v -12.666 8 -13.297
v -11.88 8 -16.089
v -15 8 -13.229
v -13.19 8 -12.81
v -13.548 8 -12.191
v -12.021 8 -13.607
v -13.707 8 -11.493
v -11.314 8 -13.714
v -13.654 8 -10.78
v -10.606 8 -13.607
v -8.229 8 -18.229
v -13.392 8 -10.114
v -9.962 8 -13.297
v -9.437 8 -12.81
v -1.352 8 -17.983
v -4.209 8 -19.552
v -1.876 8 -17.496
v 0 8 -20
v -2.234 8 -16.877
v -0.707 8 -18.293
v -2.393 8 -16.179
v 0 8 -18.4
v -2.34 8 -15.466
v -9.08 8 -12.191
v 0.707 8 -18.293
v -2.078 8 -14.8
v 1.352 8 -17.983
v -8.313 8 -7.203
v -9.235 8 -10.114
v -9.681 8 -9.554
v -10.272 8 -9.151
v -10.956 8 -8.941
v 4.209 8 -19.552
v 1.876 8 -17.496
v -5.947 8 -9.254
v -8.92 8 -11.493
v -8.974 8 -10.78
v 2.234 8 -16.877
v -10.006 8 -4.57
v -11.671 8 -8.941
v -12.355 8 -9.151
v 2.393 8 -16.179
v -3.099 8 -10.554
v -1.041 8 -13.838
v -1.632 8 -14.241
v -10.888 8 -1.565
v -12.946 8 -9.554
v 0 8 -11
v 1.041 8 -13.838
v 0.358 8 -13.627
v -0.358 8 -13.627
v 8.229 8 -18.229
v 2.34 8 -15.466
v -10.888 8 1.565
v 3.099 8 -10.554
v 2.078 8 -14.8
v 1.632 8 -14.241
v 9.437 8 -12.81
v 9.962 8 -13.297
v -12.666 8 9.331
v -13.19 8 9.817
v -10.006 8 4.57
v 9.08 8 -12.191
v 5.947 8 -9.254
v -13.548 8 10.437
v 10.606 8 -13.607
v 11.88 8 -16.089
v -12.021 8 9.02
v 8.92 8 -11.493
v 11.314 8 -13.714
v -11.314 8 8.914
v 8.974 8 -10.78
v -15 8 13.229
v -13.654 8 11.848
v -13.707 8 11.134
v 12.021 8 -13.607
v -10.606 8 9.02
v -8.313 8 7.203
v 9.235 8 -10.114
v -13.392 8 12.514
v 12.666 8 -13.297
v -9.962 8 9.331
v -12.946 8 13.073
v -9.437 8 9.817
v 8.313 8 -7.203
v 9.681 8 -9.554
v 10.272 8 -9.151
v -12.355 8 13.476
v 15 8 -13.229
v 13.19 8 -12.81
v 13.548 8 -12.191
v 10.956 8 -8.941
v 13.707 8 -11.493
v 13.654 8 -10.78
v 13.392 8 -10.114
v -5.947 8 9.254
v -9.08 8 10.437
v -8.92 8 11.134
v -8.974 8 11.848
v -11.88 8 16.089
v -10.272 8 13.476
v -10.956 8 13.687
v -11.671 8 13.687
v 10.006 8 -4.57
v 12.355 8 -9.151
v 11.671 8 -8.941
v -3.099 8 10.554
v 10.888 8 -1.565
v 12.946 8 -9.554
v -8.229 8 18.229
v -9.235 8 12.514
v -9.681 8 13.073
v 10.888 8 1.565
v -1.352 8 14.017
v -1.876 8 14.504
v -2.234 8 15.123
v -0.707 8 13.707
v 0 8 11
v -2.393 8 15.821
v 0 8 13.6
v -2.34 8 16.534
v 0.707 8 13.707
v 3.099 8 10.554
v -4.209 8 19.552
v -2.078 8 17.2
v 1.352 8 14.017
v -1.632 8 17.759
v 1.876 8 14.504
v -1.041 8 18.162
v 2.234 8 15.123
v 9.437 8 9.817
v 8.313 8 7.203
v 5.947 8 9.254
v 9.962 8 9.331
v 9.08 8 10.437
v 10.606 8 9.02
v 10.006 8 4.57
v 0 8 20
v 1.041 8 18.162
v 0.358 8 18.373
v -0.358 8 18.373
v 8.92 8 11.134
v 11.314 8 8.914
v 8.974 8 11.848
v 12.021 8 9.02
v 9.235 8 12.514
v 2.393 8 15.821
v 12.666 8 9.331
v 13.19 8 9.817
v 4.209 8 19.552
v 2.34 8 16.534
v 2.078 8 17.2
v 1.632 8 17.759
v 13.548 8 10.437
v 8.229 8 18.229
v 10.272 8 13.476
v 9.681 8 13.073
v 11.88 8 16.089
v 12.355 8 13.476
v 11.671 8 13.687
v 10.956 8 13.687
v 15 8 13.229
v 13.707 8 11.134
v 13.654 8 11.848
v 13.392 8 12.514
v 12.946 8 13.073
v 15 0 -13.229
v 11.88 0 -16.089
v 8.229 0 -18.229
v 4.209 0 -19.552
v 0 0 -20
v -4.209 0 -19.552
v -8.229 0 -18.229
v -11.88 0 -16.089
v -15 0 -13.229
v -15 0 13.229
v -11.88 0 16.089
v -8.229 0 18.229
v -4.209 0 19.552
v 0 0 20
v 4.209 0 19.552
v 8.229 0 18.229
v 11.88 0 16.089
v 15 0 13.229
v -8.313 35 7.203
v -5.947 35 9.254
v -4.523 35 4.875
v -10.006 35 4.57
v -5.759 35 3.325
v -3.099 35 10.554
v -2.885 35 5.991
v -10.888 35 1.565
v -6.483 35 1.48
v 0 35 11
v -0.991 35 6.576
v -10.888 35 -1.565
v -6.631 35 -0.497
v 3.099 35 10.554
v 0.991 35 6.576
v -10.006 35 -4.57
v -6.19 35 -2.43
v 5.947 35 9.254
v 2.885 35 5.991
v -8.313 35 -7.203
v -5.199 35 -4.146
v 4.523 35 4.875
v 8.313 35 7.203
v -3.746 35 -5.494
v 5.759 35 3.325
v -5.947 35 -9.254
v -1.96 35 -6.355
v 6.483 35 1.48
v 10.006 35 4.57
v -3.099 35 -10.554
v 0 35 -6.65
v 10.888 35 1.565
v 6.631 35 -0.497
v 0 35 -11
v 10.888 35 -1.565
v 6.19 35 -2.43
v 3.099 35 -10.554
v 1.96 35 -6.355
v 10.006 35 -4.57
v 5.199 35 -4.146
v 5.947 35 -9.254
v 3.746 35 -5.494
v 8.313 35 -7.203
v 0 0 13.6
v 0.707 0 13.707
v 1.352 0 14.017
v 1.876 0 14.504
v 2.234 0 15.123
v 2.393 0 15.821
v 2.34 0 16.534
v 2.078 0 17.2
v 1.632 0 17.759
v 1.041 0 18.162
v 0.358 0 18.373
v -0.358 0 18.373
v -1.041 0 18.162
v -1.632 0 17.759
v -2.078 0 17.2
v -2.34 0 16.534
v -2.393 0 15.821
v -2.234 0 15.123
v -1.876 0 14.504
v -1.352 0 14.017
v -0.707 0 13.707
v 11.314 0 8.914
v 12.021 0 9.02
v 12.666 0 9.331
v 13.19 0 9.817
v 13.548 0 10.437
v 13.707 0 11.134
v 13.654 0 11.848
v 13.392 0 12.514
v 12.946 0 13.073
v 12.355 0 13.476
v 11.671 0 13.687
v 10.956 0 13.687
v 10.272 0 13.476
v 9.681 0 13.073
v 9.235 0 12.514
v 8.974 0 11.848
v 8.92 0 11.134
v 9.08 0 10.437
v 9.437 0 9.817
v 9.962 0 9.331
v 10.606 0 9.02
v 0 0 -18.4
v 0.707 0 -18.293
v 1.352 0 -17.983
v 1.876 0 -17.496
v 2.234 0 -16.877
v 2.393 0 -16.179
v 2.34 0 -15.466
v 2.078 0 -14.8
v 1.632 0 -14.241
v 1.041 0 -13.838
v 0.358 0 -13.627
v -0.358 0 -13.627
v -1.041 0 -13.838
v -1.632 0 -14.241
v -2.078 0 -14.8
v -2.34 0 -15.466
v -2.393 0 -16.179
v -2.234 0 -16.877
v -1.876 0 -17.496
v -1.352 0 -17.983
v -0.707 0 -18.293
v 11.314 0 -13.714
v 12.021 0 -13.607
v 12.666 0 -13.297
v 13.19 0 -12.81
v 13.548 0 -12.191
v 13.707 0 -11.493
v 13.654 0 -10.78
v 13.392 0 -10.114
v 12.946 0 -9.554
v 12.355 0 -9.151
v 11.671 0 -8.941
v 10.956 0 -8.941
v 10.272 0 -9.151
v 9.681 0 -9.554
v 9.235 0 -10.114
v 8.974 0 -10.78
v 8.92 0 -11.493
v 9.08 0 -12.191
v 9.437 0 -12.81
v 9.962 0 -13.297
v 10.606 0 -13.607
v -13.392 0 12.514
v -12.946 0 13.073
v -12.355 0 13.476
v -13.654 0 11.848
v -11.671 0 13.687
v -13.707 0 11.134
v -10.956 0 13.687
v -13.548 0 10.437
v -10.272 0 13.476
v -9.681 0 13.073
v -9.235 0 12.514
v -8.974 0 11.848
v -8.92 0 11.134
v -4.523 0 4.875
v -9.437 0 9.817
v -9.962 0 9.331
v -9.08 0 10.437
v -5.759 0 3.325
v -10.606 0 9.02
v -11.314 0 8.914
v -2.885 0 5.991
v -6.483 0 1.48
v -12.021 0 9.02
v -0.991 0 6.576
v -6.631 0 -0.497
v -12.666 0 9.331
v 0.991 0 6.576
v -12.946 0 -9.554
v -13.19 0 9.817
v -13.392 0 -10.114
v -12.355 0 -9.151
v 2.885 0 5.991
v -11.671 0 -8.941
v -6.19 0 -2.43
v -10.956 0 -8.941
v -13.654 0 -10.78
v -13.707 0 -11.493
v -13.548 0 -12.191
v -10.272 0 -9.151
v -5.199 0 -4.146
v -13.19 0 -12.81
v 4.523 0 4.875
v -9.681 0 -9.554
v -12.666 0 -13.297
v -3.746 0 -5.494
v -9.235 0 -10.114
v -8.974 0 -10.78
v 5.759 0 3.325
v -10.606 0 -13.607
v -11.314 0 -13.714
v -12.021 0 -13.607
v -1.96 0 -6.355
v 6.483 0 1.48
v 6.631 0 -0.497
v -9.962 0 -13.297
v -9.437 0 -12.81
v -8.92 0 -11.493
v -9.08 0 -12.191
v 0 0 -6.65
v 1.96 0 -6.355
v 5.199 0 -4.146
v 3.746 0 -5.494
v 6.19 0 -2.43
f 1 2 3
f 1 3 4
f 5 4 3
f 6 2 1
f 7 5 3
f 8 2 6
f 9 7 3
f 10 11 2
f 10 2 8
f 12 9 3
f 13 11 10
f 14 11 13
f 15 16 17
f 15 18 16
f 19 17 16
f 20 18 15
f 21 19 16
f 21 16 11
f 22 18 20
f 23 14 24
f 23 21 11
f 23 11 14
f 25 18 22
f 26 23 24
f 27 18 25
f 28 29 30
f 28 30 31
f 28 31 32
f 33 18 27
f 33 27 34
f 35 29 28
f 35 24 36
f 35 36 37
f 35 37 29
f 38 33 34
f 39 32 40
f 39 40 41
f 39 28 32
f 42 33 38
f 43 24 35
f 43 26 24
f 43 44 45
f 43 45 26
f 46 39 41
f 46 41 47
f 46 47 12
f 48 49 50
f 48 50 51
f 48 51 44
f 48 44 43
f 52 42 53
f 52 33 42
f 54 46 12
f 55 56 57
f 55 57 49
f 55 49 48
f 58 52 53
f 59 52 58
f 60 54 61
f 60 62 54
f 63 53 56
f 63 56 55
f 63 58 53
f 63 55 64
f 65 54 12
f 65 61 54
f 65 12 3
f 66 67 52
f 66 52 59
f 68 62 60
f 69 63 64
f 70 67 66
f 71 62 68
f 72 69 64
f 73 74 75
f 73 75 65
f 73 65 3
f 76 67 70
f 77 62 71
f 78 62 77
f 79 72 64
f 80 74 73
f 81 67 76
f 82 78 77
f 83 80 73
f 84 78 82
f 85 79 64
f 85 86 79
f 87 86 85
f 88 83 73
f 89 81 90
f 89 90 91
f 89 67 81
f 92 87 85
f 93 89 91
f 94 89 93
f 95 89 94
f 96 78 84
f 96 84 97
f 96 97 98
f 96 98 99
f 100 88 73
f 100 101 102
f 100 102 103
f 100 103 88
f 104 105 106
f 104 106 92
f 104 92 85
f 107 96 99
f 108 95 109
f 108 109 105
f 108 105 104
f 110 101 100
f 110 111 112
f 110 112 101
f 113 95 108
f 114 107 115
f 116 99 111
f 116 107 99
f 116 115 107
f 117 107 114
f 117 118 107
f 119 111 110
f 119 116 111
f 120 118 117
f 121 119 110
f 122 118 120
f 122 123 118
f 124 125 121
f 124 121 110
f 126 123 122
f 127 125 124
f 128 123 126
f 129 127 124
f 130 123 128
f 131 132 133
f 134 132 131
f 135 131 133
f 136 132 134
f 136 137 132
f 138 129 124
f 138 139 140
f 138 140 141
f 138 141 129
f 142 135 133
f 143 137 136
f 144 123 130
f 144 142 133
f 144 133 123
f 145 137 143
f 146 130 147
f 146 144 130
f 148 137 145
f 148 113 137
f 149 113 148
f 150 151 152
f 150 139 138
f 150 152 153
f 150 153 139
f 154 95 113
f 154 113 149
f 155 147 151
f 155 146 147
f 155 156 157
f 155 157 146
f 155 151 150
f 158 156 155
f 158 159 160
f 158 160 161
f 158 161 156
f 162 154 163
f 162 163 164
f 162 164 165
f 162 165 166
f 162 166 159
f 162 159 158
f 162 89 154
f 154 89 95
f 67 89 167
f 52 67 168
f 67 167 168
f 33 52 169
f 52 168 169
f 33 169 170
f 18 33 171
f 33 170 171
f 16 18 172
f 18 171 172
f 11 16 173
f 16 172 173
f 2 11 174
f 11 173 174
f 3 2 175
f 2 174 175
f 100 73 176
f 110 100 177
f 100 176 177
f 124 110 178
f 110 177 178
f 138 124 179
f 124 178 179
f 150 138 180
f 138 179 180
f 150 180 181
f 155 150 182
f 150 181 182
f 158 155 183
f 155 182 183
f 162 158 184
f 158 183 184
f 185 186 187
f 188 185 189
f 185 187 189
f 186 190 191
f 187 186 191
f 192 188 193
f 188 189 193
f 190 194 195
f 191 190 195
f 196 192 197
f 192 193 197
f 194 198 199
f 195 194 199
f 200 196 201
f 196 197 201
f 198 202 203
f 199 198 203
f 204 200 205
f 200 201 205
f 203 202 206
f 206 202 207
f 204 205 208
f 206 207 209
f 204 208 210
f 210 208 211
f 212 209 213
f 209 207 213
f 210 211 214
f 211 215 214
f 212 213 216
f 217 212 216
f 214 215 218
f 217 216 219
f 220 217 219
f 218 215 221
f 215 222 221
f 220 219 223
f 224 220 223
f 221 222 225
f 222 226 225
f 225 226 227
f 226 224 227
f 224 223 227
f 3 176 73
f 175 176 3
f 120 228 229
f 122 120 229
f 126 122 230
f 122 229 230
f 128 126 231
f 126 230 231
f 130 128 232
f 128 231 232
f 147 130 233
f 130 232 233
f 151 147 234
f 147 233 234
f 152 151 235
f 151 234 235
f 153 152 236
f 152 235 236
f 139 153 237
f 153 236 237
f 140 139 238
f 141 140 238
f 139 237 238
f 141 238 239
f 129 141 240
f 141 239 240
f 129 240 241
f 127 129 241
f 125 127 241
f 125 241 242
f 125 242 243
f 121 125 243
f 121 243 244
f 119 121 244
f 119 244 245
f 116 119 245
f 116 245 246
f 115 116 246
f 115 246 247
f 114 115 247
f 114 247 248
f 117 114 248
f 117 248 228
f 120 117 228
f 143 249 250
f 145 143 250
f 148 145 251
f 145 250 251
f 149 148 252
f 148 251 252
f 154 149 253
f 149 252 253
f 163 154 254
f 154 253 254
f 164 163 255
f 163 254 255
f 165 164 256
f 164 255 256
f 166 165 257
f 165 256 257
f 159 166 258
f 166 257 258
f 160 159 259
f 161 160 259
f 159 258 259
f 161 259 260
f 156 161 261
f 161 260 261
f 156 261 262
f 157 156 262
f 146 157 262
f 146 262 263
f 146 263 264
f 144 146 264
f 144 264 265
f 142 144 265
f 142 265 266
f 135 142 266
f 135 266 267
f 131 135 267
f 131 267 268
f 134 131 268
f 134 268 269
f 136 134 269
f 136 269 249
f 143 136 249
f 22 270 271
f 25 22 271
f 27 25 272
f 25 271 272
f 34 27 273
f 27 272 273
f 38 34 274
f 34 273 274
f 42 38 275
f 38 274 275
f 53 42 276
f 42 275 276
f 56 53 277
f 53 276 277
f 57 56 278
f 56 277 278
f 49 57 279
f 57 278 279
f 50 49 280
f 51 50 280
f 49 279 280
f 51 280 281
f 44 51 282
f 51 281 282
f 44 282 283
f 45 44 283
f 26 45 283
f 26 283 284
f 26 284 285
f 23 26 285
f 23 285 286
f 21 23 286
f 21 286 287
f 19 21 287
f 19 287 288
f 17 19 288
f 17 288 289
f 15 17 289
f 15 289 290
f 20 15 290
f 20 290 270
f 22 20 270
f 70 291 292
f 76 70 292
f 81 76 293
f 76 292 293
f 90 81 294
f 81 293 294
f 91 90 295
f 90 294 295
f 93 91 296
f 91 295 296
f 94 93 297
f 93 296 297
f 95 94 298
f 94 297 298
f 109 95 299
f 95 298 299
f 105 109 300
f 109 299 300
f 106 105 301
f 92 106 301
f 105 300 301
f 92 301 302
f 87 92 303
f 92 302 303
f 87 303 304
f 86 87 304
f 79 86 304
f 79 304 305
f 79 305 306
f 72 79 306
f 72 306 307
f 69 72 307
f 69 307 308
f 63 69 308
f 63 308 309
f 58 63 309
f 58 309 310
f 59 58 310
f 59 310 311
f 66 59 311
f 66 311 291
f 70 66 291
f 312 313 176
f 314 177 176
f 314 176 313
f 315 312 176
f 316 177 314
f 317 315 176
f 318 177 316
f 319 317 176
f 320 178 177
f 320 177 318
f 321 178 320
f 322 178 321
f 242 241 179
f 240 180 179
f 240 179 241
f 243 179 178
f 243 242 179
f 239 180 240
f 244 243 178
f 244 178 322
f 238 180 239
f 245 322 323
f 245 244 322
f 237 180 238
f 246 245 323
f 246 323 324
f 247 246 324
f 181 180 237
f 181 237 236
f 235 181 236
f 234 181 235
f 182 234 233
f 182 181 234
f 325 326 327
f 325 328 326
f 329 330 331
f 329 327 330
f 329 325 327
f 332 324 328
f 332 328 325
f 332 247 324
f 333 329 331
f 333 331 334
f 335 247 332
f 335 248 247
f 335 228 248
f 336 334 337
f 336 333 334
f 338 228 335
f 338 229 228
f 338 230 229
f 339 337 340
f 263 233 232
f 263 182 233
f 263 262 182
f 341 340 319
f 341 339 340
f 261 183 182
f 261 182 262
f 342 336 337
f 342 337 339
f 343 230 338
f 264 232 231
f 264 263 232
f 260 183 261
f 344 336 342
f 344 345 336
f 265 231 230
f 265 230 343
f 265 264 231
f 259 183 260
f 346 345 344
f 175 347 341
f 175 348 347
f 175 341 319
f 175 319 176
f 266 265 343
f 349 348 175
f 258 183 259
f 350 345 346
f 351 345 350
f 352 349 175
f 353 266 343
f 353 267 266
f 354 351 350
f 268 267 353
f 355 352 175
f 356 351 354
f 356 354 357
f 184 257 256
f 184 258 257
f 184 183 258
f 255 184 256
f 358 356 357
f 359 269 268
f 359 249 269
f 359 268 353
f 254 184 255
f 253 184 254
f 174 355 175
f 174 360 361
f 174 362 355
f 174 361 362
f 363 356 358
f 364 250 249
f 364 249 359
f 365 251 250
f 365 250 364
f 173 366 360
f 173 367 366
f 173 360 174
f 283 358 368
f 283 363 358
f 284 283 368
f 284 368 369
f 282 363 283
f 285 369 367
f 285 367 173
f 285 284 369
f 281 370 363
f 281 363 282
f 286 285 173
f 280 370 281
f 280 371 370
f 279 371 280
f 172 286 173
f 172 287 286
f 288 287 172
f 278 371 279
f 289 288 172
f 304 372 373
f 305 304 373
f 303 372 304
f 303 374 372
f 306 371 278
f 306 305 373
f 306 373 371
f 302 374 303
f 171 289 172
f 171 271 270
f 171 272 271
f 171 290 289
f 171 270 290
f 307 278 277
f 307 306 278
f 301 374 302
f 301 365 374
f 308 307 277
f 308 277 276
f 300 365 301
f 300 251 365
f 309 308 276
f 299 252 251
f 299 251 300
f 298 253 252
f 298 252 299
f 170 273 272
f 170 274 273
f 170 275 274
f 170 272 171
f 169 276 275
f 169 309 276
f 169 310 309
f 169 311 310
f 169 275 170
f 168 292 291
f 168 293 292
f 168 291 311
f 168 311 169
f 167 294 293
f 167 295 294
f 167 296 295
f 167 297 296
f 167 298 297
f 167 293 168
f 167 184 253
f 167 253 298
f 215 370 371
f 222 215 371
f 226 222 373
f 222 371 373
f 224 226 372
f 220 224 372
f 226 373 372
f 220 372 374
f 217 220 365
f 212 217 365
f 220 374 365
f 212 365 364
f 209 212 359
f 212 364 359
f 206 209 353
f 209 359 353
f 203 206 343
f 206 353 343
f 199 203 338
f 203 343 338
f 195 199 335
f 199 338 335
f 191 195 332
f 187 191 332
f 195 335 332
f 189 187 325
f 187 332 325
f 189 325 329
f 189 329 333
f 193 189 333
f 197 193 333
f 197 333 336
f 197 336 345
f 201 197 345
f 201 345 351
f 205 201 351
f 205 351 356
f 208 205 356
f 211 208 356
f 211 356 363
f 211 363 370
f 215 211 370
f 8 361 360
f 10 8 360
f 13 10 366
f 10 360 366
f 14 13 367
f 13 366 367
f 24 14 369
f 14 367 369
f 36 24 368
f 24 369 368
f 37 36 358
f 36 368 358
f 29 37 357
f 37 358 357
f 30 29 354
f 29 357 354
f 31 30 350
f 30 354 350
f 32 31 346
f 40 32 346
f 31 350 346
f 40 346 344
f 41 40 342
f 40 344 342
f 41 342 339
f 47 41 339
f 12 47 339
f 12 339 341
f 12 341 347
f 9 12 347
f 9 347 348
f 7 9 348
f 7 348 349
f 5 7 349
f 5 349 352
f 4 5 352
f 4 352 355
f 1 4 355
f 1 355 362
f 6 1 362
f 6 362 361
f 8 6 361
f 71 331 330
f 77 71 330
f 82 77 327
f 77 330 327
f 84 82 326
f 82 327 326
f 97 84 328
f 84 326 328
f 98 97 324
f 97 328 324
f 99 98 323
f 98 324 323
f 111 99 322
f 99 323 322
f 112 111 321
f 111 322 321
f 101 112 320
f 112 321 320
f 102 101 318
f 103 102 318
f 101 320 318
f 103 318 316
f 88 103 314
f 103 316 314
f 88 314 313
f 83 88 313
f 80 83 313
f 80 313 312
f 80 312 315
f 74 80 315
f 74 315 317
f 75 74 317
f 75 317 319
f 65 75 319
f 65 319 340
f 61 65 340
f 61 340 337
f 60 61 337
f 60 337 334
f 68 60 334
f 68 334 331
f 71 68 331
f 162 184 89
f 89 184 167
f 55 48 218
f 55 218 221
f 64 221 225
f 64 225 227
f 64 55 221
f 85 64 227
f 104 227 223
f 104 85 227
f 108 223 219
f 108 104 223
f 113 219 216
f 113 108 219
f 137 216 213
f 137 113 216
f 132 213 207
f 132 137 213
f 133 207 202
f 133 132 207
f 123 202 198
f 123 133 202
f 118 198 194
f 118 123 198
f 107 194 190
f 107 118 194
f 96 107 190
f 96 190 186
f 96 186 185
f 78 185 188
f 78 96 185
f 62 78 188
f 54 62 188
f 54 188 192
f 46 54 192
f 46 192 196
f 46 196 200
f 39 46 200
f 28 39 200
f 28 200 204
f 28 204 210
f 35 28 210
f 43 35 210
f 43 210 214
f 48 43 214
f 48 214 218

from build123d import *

# Parameters (mm, degrees)
SKETCH_1_R          = 20
EXTRUDE_1_DEPTH     = 8
SKETCH_3_R          = 11
EXTRUDE_2_DEPTH     = 35
CUT_EXTRUDE_1_DEPTH = 46
SKETCH_6_R          = 2.4
CUT_EXTRUDE_2_DEPTH = 44.011626335
SKETCH_7_R          = 6.65
CUT_EXTRUDE_3_DEPTH = 44.011626335


with BuildPart() as part:
    # 草图1 → 凸台-拉伸1 (new body)
    with BuildSketch(Plane(origin=(0, 0, 0), x_dir=(1, 0, 0), z_dir=(0, 1, 0))):
        with Locations(Location((0, 0, 0), (0, 0, 270))):
            Circle(SKETCH_1_R)
    extrude(amount=EXTRUDE_1_DEPTH)

    # 草图3 → 凸台-拉伸2 (add)
    with BuildSketch(Plane.XZ):
        with Locations(Location((0, 0, 0), (0, 0, 270))):
            Circle(SKETCH_3_R)
    extrude(amount=-EXTRUDE_2_DEPTH)

    # 草图4 → 切除-拉伸1 (cut, through all)
    with BuildSketch(Plane.XZ):
        with BuildLine():
            Line((-15, 13.228756555), (-15, -13.228756555))
            ThreePointArc((-15, -13.228756555), (-20, 0), (-15, 13.228756555))
        make_face()
        with BuildLine():
            Line((15, 13.228756555), (15, -13.228756555))
            ThreePointArc((15, -13.228756555), (20, 0), (15, 13.228756555))
        make_face()
    extrude(amount=-CUT_EXTRUDE_1_DEPTH, mode=Mode.SUBTRACT)

    # 草图6 → 切除-拉伸2 (cut, through all)
    with BuildSketch(Plane.XZ):
        with Locations(Location((0, 16, 0), (0, 0, 270))):
            Circle(SKETCH_6_R)
        with Locations(Location((11.313708499, 11.313708499, 0), (0, 0, 270))):
            Circle(SKETCH_6_R)
        with Locations(Location((11.313708499, -11.313708499, 0), (0, 0, 270))):
            Circle(SKETCH_6_R)
        with Locations(Location((0, -16, 0), (0, 0, 270))):
            Circle(SKETCH_6_R)
        with Locations(Location((-11.313708499, -11.313708499, 0), (0, 0, 270))):
            Circle(SKETCH_6_R)
        with Locations(Location((-11.313708499, 11.313708499, 0), (0, 0, 270))):
            Circle(SKETCH_6_R)
    extrude(amount=-CUT_EXTRUDE_2_DEPTH, mode=Mode.SUBTRACT)

    # 草图7 → 切除-拉伸3 (cut, through all)
    with BuildSketch(Plane.XZ):
        with Locations(Location((0, 0, 0), (0, 0, 270))):
            Circle(SKETCH_7_R)
    extrude(amount=-CUT_EXTRUDE_3_DEPTH, mode=Mode.SUBTRACT)


solid = part.part
